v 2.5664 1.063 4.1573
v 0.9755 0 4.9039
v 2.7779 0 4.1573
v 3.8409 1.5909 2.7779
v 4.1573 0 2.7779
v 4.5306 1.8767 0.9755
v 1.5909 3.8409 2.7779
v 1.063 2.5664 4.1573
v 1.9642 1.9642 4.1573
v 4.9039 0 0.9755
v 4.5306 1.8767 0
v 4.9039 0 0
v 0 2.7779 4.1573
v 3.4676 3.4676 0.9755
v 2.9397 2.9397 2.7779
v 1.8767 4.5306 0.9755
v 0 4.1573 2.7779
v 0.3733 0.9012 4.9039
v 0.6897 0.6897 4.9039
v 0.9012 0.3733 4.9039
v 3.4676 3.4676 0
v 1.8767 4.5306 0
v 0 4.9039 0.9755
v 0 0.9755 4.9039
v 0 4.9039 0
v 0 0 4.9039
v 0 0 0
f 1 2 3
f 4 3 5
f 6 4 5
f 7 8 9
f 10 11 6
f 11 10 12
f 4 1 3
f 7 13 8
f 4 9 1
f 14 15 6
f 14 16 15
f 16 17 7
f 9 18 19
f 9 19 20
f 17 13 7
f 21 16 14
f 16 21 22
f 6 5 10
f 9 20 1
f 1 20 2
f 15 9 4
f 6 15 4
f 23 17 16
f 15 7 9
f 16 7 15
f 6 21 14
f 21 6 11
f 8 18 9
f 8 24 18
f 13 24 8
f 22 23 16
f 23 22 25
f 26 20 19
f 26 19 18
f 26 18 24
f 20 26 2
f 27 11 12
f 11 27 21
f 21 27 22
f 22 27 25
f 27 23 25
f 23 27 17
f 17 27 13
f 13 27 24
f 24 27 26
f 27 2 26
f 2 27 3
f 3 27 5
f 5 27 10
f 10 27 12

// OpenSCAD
//Author: 
//Date: 
//Description: Lesson 2-4 Combing shapes with intersections

//Render this code!
intersection() {
sphere(5);
cube([10, 10, 10]);
}

//1. Take the intersection of a sphere and a cube so that a quarter of the sphere remains in octant 2

//2. Using intersection make a quarter of a circle (cylinder) in the first octant

//3. Using intersection make a half of a circle (cylinder) in the first and second octants

//4. Using intersection make two quarters of a circle (cylinder) in adjacent octants (i.e. 1 and 3)

//Bonus: Make a dice
